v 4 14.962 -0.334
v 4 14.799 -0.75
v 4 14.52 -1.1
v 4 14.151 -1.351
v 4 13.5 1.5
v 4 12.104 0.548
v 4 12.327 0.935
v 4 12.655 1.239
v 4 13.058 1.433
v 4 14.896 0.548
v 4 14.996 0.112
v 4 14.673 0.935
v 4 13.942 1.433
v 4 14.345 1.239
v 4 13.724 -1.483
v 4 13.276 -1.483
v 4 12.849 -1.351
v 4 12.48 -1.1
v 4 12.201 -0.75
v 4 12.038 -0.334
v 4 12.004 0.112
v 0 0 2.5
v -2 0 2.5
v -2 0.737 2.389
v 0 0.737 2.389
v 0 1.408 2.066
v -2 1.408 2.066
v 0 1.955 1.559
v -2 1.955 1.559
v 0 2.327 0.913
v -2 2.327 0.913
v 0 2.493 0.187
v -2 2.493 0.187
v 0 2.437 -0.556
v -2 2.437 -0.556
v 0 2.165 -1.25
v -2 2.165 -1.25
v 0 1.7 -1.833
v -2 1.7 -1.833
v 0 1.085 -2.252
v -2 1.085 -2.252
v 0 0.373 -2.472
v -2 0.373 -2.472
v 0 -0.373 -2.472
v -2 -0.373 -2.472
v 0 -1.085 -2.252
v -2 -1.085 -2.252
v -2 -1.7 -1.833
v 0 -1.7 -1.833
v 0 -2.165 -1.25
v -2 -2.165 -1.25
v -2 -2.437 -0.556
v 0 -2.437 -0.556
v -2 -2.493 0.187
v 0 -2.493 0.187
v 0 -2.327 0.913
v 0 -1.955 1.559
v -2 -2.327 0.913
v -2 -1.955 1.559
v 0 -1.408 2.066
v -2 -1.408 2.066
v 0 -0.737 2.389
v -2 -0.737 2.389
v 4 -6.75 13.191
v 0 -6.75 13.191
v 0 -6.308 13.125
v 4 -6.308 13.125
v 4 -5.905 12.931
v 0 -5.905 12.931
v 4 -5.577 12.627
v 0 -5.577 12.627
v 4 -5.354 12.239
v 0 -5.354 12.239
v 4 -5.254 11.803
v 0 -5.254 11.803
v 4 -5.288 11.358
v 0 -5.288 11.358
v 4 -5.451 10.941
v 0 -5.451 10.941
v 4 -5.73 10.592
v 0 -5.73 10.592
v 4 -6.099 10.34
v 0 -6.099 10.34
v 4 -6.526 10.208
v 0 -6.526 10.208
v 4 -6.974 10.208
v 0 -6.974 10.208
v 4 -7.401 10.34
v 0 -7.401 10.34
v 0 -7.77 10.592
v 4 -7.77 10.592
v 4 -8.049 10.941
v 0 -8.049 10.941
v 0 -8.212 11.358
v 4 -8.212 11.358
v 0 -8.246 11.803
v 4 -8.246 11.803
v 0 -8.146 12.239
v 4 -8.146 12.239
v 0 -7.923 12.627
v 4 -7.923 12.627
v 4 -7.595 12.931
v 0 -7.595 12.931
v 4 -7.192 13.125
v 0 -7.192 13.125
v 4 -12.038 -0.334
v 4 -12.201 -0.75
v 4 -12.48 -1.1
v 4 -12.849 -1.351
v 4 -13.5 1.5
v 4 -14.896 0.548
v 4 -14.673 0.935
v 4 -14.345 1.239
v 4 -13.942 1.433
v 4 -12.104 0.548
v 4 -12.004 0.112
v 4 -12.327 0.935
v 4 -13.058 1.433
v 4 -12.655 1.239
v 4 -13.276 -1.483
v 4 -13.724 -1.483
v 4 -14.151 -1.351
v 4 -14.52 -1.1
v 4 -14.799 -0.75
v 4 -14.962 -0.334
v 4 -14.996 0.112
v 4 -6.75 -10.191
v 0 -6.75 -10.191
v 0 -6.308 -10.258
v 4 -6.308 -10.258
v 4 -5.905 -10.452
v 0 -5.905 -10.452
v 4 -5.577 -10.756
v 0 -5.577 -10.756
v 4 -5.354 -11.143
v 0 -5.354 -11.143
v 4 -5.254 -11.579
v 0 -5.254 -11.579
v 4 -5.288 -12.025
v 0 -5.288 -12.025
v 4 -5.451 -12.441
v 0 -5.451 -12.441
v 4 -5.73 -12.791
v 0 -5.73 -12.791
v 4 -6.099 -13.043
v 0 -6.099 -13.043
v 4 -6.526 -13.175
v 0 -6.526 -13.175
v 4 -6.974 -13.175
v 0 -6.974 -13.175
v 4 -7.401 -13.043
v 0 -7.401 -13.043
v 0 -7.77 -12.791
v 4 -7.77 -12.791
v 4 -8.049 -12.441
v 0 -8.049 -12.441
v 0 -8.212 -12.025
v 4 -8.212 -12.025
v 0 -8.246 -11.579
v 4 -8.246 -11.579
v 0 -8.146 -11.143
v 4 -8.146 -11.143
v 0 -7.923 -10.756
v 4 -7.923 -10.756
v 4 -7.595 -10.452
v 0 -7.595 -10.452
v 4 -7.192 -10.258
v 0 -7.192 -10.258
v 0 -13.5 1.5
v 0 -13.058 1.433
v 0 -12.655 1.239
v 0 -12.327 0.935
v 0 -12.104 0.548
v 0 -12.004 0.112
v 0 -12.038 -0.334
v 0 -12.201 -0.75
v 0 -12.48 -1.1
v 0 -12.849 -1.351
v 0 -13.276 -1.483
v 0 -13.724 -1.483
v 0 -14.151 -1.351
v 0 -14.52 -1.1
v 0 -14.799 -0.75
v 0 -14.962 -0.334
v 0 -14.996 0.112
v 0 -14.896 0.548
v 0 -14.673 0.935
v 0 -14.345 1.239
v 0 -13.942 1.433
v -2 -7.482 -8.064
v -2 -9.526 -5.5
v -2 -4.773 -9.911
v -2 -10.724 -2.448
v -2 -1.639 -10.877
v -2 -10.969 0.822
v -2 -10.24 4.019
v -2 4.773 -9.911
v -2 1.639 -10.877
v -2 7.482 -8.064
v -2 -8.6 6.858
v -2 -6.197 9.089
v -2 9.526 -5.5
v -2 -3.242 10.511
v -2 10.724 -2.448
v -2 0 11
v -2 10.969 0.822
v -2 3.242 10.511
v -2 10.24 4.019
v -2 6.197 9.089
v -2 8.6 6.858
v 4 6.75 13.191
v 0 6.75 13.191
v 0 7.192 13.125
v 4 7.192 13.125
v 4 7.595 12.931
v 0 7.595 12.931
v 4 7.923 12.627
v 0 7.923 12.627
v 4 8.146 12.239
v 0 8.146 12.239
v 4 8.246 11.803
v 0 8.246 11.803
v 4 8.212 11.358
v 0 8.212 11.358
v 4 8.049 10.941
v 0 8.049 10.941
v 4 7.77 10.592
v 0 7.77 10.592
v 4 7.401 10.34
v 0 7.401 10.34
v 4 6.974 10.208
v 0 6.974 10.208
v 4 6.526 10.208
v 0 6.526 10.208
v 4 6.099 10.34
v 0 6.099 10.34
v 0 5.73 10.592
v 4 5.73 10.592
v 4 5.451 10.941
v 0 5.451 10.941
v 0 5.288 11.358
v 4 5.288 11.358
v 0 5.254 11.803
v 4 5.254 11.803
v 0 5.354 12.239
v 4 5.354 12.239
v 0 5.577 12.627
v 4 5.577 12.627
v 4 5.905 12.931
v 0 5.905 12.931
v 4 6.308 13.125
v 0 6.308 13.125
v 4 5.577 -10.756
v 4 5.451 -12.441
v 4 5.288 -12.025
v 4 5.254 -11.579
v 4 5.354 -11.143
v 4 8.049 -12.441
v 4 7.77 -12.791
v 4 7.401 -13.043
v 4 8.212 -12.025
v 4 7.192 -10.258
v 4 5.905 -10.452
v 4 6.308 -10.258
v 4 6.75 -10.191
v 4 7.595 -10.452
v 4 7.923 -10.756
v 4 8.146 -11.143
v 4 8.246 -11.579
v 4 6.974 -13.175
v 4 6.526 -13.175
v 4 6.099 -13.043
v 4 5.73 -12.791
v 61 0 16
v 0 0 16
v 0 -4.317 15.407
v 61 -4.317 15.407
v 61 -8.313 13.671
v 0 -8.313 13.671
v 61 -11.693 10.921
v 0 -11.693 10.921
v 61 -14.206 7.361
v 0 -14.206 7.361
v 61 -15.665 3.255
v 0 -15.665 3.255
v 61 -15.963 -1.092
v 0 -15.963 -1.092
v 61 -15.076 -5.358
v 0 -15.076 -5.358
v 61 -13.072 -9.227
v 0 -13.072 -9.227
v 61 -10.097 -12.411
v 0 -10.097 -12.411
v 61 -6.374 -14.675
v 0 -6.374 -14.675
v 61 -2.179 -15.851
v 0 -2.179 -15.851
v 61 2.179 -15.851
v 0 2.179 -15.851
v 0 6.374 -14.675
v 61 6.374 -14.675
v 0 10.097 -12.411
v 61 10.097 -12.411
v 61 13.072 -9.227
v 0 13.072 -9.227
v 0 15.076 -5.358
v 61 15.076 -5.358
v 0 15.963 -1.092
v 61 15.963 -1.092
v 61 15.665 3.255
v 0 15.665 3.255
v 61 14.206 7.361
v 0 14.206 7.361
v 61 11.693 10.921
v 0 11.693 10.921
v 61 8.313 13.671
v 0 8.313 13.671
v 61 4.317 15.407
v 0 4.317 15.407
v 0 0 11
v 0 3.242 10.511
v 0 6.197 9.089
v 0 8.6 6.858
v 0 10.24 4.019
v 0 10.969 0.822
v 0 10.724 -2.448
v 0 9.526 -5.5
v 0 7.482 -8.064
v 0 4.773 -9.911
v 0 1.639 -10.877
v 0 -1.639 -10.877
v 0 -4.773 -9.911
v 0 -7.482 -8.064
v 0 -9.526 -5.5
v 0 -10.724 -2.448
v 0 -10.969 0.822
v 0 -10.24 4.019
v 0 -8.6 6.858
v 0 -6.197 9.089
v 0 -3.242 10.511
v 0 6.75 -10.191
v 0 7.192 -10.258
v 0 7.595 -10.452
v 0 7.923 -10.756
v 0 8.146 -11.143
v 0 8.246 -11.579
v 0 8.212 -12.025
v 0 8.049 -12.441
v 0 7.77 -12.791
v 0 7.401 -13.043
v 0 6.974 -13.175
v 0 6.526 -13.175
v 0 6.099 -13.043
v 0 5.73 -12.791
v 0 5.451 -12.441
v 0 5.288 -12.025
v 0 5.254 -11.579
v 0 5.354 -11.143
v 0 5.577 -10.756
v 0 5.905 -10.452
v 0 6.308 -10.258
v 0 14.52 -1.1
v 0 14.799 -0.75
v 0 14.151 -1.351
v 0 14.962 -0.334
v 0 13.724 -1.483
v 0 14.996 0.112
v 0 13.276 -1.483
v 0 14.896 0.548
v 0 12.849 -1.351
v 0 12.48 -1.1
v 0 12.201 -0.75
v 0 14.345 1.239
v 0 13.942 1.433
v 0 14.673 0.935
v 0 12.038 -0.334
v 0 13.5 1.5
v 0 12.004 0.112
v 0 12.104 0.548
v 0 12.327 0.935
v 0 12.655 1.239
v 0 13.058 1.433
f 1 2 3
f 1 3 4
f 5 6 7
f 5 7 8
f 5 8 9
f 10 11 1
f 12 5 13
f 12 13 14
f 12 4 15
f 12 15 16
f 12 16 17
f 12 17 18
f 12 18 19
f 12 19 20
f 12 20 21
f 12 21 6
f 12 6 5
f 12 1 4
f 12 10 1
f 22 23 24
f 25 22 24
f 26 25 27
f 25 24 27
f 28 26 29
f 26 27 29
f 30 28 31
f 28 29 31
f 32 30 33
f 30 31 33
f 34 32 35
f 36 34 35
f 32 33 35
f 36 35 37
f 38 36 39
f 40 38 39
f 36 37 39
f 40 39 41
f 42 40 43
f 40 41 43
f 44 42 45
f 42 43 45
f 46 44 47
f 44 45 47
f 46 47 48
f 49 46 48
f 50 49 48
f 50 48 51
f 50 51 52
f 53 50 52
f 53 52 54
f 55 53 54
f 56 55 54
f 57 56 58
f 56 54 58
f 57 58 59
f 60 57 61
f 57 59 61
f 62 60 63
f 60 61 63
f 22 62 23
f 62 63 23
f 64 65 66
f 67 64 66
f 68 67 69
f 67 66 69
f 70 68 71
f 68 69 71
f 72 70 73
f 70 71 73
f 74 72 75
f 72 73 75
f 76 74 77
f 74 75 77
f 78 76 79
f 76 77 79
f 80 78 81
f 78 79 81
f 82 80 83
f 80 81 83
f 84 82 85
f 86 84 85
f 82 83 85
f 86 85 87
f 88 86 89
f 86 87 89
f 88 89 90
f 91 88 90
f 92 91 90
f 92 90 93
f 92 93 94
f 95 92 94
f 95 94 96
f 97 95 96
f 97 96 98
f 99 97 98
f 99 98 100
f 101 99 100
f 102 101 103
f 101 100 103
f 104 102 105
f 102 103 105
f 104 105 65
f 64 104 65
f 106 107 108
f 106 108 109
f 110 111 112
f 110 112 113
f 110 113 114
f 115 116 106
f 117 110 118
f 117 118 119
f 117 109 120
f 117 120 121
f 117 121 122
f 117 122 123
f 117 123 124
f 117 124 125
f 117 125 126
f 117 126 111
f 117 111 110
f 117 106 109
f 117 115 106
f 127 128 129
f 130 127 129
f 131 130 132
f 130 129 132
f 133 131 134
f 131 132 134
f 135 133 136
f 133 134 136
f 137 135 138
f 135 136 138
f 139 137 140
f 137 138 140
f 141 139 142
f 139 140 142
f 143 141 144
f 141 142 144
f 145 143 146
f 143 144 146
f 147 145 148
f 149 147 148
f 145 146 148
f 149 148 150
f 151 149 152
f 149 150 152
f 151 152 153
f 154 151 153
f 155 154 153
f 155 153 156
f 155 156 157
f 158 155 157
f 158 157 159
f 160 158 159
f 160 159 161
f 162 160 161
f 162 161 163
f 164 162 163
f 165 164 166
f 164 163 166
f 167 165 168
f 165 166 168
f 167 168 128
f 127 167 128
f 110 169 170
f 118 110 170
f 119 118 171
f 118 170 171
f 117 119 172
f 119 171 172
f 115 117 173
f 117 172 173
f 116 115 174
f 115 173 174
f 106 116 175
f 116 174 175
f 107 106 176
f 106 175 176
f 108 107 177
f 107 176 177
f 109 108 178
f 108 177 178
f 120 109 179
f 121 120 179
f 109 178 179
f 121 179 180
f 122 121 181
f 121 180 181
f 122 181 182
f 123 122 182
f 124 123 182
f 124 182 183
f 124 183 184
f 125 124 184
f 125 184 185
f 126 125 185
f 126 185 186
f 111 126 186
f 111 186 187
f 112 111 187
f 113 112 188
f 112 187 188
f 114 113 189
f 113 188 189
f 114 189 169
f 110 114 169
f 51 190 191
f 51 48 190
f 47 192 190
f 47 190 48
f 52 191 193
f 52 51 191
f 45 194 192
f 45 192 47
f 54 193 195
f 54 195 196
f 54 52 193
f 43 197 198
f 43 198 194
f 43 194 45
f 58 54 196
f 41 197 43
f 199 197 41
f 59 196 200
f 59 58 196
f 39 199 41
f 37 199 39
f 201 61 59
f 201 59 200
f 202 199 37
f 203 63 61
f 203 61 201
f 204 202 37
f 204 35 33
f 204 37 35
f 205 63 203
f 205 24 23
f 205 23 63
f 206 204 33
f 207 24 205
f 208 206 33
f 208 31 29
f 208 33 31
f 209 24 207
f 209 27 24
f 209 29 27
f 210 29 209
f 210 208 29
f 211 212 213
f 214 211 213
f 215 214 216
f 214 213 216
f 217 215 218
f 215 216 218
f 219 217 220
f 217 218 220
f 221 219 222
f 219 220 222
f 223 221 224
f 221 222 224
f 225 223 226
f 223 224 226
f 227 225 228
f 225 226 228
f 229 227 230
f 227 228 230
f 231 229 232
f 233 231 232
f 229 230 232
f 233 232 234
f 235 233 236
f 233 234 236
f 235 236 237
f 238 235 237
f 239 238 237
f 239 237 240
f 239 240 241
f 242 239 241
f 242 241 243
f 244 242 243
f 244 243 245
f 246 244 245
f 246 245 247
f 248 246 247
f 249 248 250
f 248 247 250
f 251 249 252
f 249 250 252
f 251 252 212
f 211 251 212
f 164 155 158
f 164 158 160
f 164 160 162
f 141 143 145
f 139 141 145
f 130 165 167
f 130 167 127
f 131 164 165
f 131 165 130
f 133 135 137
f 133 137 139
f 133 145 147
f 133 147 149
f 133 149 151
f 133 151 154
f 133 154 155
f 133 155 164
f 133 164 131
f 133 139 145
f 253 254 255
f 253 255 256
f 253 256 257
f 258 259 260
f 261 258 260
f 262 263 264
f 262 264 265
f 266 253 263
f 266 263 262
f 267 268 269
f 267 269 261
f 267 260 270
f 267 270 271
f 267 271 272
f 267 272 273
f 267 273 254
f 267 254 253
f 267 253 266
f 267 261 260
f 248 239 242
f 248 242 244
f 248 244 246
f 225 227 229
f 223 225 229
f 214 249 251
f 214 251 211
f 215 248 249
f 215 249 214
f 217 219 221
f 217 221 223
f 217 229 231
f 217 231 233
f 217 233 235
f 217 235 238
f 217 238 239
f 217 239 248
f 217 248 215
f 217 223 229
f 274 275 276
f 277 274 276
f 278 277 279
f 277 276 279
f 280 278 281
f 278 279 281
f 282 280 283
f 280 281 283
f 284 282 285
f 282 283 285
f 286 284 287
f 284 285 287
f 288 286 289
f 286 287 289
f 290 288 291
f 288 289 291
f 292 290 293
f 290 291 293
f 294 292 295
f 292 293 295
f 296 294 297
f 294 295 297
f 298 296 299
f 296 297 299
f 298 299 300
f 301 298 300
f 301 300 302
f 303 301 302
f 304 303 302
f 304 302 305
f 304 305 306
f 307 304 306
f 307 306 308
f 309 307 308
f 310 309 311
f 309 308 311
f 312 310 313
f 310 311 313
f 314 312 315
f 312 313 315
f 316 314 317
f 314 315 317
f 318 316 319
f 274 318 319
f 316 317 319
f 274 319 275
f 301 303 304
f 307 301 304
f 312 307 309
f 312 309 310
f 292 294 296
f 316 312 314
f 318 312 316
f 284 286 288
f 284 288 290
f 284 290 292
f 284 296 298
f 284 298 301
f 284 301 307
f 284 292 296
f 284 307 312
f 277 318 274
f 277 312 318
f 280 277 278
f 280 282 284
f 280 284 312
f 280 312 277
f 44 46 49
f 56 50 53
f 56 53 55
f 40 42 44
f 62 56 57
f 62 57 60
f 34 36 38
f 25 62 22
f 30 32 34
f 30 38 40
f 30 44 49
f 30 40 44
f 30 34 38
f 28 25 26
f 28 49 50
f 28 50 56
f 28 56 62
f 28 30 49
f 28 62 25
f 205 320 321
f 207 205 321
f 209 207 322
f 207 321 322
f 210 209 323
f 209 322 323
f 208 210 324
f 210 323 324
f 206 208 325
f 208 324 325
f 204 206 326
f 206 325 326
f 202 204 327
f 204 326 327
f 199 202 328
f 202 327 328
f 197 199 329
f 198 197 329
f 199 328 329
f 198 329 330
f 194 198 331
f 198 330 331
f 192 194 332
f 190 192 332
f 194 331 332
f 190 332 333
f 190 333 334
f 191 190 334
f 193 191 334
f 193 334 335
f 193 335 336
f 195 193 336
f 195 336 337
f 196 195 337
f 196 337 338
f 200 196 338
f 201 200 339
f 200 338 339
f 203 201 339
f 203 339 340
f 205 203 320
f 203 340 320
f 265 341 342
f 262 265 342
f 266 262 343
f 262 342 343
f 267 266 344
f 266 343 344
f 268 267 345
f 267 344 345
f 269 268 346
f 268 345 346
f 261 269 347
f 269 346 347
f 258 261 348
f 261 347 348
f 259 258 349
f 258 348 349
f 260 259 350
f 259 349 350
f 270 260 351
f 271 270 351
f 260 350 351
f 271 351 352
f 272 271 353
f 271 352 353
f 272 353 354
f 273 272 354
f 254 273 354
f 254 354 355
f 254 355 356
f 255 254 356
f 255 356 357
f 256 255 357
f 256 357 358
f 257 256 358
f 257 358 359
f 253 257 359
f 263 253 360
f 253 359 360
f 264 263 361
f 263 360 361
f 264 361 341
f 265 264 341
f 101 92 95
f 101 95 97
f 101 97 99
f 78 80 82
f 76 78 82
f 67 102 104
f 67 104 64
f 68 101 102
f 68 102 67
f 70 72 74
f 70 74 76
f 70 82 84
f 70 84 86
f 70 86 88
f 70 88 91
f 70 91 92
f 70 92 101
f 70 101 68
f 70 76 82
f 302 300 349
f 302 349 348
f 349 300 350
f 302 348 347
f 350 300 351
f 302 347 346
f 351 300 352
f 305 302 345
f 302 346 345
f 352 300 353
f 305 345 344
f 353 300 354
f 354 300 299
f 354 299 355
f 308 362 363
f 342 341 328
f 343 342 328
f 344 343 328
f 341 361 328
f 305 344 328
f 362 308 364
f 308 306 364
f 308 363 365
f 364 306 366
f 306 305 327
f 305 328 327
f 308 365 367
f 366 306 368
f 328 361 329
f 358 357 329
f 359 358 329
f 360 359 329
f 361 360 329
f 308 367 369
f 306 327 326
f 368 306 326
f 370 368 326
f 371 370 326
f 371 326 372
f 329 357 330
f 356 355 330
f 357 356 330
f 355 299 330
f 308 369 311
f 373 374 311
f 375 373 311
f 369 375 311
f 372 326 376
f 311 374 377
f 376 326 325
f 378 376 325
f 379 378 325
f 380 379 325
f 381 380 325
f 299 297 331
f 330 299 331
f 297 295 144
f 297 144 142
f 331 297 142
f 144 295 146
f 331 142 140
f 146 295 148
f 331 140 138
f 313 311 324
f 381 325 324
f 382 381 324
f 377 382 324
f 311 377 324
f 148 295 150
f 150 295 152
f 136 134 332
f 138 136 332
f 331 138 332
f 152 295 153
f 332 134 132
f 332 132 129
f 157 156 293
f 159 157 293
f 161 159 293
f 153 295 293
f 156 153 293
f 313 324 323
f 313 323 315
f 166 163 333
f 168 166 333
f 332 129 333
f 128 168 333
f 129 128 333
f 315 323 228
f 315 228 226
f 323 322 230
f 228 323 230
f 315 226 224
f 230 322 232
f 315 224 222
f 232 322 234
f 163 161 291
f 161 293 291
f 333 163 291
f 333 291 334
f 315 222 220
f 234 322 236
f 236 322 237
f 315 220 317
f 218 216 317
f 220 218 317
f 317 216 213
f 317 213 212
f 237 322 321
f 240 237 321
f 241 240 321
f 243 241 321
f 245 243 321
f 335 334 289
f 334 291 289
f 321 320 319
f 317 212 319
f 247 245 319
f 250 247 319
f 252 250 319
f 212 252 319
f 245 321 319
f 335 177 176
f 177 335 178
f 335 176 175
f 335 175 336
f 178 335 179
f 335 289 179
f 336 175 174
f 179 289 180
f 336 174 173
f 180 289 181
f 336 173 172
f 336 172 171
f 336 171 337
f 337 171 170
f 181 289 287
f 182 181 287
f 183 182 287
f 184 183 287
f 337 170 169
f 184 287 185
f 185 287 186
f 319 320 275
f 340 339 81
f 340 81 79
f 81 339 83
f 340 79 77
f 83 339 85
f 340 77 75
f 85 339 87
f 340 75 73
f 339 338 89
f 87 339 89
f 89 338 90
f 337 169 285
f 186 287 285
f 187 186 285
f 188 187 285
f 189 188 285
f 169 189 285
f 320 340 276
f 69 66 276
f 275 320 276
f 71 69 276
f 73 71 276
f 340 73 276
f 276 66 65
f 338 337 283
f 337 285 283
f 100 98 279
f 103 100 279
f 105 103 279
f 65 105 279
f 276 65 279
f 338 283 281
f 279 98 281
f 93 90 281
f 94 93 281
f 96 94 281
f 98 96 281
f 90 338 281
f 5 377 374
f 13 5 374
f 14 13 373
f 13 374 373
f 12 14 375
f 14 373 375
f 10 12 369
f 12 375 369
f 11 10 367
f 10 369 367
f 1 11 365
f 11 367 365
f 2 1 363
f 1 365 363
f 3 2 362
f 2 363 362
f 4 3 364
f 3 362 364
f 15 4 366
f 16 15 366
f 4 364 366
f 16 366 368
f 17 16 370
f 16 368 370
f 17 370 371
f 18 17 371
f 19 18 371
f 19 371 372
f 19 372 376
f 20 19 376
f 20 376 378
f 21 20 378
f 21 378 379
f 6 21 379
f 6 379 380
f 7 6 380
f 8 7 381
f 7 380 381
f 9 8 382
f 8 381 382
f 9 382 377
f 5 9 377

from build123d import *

# Parameters (mm, degrees)
SKETCH1_R           = 16
BOSS_EXTRUDE1_DEPTH = 61
SKETCH2_R           = 11
BOSS_EXTRUDE2_DEPTH = 2
SKETCH3_R           = 1.5
CUT_EXTRUDE1_DEPTH  = 4
SKETCH4_R           = 2.5
CUT_EXTRUDE2_DEPTH  = 2


with BuildPart() as part:
    # Sketch1 → Boss-Extrude1 (new body)
    with BuildSketch(Plane(origin=(0, 0, 0), x_dir=(0, 0, -1), z_dir=(1, 0, 0))):
        with Locations(Location((0, 0, 0), (0, 0, 180))):
            Circle(SKETCH1_R)
    extrude(amount=BOSS_EXTRUDE1_DEPTH)

    # Sketch2 → Boss-Extrude2 (add)
    with BuildSketch(Plane.ZY):
        Circle(SKETCH2_R)
    extrude(amount=BOSS_EXTRUDE2_DEPTH)

    # Sketch3 → Cut-Extrude1 (cut)
    with BuildSketch(Plane.ZY):
        with Locations((0, 13.5)):
            Circle(SKETCH3_R)
        with Locations((11.691342951, 6.75)):
            Circle(SKETCH3_R)
        with Locations((11.691342951, -6.75)):
            Circle(SKETCH3_R)
        with Locations((0, -13.5)):
            Circle(SKETCH3_R)
        with Locations((-11.691342951, -6.75)):
            Circle(SKETCH3_R)
        with Locations((-11.691342951, 6.75)):
            Circle(SKETCH3_R)
    extrude(amount=-CUT_EXTRUDE1_DEPTH, mode=Mode.SUBTRACT)

    # Sketch4 → Cut-Extrude2 (cut)
    with BuildSketch(Plane.ZY.offset(2)):
        Circle(SKETCH4_R)
    extrude(amount=-CUT_EXTRUDE2_DEPTH, mode=Mode.SUBTRACT)


solid = part.part
